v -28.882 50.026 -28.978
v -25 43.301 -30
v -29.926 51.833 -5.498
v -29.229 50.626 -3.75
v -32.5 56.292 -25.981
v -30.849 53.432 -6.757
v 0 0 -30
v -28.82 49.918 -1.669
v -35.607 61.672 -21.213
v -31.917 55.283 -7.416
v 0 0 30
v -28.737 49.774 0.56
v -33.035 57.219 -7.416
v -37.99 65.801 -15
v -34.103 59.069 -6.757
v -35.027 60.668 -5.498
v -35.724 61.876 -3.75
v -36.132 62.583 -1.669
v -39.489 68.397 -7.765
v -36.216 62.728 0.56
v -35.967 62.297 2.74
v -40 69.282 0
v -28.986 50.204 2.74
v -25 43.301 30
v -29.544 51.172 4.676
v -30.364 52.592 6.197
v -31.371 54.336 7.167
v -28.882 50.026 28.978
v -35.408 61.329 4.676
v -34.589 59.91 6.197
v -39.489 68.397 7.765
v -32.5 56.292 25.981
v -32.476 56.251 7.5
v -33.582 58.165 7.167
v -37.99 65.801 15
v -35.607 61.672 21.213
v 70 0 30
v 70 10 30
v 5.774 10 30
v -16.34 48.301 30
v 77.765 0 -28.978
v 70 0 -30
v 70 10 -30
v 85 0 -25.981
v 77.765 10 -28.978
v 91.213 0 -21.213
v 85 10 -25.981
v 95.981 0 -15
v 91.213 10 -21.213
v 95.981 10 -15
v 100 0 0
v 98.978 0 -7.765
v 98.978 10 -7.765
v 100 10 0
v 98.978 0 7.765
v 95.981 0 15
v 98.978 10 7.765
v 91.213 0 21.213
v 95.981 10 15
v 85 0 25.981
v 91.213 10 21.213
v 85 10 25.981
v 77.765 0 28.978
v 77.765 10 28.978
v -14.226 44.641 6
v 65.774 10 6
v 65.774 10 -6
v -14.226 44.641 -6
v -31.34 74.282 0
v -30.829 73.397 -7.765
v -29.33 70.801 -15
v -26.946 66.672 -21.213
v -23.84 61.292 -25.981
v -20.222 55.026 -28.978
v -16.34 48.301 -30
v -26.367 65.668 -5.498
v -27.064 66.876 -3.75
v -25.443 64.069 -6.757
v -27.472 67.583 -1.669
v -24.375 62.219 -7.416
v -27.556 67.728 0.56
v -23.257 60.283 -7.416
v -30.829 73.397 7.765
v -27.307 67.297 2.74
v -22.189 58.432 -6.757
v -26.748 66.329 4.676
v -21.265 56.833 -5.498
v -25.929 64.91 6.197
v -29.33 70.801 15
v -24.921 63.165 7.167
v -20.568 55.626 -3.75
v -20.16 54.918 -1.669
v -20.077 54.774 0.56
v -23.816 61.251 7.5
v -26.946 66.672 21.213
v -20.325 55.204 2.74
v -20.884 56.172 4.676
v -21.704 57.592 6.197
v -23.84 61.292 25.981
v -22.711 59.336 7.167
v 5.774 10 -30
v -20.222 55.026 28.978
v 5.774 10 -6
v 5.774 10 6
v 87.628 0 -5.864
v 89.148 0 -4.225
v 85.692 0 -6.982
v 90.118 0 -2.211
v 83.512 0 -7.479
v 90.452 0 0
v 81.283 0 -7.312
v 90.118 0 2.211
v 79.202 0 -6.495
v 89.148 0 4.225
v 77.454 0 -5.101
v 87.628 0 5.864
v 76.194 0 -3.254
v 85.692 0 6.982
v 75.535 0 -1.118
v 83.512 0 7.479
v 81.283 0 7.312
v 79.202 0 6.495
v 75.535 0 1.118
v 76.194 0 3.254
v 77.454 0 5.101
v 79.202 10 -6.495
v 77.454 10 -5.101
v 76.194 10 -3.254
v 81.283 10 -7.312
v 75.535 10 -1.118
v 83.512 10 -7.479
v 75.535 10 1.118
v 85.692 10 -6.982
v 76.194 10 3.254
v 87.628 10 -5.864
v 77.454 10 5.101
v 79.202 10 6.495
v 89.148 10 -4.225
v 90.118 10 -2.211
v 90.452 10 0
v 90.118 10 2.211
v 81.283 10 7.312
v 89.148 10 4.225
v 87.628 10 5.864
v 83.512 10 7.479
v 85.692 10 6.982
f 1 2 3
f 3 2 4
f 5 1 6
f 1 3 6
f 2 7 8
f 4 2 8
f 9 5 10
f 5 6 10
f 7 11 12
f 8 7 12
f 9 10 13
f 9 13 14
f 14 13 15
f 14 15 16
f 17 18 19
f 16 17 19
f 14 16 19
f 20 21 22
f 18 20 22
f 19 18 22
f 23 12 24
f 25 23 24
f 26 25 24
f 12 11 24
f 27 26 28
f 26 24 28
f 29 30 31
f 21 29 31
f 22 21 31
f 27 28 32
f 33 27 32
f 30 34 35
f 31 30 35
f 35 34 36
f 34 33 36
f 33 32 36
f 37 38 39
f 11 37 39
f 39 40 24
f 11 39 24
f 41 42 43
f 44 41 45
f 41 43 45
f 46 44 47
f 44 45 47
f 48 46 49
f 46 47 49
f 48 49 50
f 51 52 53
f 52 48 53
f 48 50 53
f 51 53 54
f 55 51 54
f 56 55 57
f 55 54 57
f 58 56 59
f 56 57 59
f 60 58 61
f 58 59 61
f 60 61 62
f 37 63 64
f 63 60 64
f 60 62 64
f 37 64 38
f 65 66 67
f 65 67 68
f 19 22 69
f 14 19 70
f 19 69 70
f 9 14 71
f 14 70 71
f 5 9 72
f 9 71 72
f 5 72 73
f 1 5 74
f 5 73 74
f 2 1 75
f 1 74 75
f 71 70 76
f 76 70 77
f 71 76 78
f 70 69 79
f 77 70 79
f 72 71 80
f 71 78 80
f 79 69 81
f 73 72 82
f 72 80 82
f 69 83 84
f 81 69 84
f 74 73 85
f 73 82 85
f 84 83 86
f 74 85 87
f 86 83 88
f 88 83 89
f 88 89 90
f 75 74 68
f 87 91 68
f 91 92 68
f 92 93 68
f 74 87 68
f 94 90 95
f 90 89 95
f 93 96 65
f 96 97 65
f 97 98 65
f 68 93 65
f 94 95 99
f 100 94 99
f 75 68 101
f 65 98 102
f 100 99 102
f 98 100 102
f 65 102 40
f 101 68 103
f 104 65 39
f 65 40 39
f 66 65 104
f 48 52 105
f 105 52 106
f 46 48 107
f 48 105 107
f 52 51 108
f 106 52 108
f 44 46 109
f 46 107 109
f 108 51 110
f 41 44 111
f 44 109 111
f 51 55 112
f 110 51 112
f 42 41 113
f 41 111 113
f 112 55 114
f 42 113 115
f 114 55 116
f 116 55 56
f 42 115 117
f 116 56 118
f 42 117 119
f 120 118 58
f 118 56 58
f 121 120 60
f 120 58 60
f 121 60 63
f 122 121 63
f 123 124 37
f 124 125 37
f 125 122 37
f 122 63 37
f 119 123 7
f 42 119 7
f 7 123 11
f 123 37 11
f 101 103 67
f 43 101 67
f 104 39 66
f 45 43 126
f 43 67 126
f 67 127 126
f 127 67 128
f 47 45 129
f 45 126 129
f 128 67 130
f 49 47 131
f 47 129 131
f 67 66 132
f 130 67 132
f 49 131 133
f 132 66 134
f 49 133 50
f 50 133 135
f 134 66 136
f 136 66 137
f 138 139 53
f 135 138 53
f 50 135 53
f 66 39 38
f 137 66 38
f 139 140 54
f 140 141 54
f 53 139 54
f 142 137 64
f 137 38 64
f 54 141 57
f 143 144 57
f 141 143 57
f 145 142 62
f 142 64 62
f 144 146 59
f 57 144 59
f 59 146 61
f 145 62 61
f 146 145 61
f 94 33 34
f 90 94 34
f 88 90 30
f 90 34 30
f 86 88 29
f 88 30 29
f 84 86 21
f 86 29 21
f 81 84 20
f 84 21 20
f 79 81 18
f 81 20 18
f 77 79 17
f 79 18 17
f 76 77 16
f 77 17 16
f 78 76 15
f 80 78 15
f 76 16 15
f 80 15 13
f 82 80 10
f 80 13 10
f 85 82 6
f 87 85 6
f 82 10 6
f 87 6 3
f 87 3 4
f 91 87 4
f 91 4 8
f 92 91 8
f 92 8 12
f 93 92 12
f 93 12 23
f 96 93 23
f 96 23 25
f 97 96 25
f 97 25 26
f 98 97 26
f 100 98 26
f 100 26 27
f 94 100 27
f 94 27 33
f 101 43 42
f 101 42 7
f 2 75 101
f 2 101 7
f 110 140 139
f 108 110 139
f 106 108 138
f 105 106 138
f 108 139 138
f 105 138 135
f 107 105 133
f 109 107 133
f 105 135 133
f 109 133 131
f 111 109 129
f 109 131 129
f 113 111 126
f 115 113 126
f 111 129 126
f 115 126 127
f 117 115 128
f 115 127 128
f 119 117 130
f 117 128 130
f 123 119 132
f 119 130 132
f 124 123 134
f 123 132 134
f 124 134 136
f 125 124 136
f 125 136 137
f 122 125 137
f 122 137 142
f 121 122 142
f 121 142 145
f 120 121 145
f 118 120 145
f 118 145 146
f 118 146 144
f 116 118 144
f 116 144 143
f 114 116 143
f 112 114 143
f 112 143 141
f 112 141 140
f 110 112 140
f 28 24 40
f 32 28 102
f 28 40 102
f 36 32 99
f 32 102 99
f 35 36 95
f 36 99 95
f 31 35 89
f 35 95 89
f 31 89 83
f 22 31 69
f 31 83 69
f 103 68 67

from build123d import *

# Parameters (mm, degrees)
BOSS_EXTRUDE1_DEPTH = 30
CUT_EXTRUDE1_DEPTH  = 60
CUT_EXTRUDE2_DEPTH  = 60
BOSS_EXTRUDE2_DEPTH = 6
SKETCH6_R           = 7.5
CUT_EXTRUDE3_DEPTH  = 12
SKETCH7_R           = 7.5
CUT_EXTRUDE4_DEPTH  = 12


with BuildPart() as part:
    # Sketch2 → Boss-Extrude1 (new body, symmetric)
    with BuildSketch(Plane.XY):
        Polygon((100, 0), (0, 0), (-40, 69.282032303), (-31.339745962, 74.282032303), (5.773502692, 10), (100, 10), align=None)
    extrude(amount=BOSS_EXTRUDE1_DEPTH, both=True)

    # Sketch3 → Cut-Extrude1 (cut)
    with BuildSketch(Plane(origin=(0, 10, 0), x_dir=(1, 0, 0), z_dir=(0, 1, 0))):
        with BuildLine():
            ThreePointArc((70, 30), (91.213203452, 21.213203419), (100, -4.6e-08))
            Line((100, -4.6e-08), (100, 30))
            Line((100, 30), (70, 30))
        make_face()
        with BuildLine():
            Line((70, -30), (100, -30))
            Line((100, -30), (100, -4.6e-08))
            ThreePointArc((100, -4.6e-08), (91.213203419, -21.213203452), (70, -30))
        make_face()
    extrude(amount=-CUT_EXTRUDE1_DEPTH, mode=Mode.SUBTRACT)

    # Sketch4 → Cut-Extrude2 (cut)
    with BuildSketch(Plane(origin=(8.660254038, 5, 0), x_dir=(0, 0, -1), z_dir=(0.866025404, 0.5, 0))):
        with BuildLine():
            ThreePointArc((-30, 50), (-21.213203436, 71.213203436), (0, 80))
            Line((0, 80), (-30, 80))
            Line((-30, 80), (-30, 50))
        make_face()
        with BuildLine():
            ThreePointArc((0, 80), (21.213203436, 71.213203436), (30, 50))
            Line((30, 50), (30, 80))
            Line((30, 80), (0, 80))
        make_face()
    extrude(amount=-CUT_EXTRUDE2_DEPTH, mode=Mode.SUBTRACT)

    # Sketch5 → Boss-Extrude2 (add, symmetric)
    with BuildSketch(Plane.XY):
        Polygon((5.773502692, 10), (65.773502692, 10), (-14.226497308, 44.641016151), align=None)
    extrude(amount=BOSS_EXTRUDE2_DEPTH, both=True)

    # Sketch6 → Cut-Extrude3 (cut)
    with BuildSketch(Plane(origin=(0, 10, 0), x_dir=(1, 0, 0), z_dir=(0, 1, 0))):
        with Locations((82.951530003, 0)):
            Circle(SKETCH6_R)
    extrude(amount=-CUT_EXTRUDE3_DEPTH, mode=Mode.SUBTRACT)

    # Sketch7 → Cut-Extrude4 (cut)
    with BuildSketch(Plane(origin=(0, 0, 0), x_dir=(0, 0, 1), z_dir=(-0.866025404, -0.5, 0))):
        with Locations((0, 64.952644295)):
            Circle(SKETCH7_R)
    extrude(amount=-CUT_EXTRUDE4_DEPTH, mode=Mode.SUBTRACT)


solid = part.part
